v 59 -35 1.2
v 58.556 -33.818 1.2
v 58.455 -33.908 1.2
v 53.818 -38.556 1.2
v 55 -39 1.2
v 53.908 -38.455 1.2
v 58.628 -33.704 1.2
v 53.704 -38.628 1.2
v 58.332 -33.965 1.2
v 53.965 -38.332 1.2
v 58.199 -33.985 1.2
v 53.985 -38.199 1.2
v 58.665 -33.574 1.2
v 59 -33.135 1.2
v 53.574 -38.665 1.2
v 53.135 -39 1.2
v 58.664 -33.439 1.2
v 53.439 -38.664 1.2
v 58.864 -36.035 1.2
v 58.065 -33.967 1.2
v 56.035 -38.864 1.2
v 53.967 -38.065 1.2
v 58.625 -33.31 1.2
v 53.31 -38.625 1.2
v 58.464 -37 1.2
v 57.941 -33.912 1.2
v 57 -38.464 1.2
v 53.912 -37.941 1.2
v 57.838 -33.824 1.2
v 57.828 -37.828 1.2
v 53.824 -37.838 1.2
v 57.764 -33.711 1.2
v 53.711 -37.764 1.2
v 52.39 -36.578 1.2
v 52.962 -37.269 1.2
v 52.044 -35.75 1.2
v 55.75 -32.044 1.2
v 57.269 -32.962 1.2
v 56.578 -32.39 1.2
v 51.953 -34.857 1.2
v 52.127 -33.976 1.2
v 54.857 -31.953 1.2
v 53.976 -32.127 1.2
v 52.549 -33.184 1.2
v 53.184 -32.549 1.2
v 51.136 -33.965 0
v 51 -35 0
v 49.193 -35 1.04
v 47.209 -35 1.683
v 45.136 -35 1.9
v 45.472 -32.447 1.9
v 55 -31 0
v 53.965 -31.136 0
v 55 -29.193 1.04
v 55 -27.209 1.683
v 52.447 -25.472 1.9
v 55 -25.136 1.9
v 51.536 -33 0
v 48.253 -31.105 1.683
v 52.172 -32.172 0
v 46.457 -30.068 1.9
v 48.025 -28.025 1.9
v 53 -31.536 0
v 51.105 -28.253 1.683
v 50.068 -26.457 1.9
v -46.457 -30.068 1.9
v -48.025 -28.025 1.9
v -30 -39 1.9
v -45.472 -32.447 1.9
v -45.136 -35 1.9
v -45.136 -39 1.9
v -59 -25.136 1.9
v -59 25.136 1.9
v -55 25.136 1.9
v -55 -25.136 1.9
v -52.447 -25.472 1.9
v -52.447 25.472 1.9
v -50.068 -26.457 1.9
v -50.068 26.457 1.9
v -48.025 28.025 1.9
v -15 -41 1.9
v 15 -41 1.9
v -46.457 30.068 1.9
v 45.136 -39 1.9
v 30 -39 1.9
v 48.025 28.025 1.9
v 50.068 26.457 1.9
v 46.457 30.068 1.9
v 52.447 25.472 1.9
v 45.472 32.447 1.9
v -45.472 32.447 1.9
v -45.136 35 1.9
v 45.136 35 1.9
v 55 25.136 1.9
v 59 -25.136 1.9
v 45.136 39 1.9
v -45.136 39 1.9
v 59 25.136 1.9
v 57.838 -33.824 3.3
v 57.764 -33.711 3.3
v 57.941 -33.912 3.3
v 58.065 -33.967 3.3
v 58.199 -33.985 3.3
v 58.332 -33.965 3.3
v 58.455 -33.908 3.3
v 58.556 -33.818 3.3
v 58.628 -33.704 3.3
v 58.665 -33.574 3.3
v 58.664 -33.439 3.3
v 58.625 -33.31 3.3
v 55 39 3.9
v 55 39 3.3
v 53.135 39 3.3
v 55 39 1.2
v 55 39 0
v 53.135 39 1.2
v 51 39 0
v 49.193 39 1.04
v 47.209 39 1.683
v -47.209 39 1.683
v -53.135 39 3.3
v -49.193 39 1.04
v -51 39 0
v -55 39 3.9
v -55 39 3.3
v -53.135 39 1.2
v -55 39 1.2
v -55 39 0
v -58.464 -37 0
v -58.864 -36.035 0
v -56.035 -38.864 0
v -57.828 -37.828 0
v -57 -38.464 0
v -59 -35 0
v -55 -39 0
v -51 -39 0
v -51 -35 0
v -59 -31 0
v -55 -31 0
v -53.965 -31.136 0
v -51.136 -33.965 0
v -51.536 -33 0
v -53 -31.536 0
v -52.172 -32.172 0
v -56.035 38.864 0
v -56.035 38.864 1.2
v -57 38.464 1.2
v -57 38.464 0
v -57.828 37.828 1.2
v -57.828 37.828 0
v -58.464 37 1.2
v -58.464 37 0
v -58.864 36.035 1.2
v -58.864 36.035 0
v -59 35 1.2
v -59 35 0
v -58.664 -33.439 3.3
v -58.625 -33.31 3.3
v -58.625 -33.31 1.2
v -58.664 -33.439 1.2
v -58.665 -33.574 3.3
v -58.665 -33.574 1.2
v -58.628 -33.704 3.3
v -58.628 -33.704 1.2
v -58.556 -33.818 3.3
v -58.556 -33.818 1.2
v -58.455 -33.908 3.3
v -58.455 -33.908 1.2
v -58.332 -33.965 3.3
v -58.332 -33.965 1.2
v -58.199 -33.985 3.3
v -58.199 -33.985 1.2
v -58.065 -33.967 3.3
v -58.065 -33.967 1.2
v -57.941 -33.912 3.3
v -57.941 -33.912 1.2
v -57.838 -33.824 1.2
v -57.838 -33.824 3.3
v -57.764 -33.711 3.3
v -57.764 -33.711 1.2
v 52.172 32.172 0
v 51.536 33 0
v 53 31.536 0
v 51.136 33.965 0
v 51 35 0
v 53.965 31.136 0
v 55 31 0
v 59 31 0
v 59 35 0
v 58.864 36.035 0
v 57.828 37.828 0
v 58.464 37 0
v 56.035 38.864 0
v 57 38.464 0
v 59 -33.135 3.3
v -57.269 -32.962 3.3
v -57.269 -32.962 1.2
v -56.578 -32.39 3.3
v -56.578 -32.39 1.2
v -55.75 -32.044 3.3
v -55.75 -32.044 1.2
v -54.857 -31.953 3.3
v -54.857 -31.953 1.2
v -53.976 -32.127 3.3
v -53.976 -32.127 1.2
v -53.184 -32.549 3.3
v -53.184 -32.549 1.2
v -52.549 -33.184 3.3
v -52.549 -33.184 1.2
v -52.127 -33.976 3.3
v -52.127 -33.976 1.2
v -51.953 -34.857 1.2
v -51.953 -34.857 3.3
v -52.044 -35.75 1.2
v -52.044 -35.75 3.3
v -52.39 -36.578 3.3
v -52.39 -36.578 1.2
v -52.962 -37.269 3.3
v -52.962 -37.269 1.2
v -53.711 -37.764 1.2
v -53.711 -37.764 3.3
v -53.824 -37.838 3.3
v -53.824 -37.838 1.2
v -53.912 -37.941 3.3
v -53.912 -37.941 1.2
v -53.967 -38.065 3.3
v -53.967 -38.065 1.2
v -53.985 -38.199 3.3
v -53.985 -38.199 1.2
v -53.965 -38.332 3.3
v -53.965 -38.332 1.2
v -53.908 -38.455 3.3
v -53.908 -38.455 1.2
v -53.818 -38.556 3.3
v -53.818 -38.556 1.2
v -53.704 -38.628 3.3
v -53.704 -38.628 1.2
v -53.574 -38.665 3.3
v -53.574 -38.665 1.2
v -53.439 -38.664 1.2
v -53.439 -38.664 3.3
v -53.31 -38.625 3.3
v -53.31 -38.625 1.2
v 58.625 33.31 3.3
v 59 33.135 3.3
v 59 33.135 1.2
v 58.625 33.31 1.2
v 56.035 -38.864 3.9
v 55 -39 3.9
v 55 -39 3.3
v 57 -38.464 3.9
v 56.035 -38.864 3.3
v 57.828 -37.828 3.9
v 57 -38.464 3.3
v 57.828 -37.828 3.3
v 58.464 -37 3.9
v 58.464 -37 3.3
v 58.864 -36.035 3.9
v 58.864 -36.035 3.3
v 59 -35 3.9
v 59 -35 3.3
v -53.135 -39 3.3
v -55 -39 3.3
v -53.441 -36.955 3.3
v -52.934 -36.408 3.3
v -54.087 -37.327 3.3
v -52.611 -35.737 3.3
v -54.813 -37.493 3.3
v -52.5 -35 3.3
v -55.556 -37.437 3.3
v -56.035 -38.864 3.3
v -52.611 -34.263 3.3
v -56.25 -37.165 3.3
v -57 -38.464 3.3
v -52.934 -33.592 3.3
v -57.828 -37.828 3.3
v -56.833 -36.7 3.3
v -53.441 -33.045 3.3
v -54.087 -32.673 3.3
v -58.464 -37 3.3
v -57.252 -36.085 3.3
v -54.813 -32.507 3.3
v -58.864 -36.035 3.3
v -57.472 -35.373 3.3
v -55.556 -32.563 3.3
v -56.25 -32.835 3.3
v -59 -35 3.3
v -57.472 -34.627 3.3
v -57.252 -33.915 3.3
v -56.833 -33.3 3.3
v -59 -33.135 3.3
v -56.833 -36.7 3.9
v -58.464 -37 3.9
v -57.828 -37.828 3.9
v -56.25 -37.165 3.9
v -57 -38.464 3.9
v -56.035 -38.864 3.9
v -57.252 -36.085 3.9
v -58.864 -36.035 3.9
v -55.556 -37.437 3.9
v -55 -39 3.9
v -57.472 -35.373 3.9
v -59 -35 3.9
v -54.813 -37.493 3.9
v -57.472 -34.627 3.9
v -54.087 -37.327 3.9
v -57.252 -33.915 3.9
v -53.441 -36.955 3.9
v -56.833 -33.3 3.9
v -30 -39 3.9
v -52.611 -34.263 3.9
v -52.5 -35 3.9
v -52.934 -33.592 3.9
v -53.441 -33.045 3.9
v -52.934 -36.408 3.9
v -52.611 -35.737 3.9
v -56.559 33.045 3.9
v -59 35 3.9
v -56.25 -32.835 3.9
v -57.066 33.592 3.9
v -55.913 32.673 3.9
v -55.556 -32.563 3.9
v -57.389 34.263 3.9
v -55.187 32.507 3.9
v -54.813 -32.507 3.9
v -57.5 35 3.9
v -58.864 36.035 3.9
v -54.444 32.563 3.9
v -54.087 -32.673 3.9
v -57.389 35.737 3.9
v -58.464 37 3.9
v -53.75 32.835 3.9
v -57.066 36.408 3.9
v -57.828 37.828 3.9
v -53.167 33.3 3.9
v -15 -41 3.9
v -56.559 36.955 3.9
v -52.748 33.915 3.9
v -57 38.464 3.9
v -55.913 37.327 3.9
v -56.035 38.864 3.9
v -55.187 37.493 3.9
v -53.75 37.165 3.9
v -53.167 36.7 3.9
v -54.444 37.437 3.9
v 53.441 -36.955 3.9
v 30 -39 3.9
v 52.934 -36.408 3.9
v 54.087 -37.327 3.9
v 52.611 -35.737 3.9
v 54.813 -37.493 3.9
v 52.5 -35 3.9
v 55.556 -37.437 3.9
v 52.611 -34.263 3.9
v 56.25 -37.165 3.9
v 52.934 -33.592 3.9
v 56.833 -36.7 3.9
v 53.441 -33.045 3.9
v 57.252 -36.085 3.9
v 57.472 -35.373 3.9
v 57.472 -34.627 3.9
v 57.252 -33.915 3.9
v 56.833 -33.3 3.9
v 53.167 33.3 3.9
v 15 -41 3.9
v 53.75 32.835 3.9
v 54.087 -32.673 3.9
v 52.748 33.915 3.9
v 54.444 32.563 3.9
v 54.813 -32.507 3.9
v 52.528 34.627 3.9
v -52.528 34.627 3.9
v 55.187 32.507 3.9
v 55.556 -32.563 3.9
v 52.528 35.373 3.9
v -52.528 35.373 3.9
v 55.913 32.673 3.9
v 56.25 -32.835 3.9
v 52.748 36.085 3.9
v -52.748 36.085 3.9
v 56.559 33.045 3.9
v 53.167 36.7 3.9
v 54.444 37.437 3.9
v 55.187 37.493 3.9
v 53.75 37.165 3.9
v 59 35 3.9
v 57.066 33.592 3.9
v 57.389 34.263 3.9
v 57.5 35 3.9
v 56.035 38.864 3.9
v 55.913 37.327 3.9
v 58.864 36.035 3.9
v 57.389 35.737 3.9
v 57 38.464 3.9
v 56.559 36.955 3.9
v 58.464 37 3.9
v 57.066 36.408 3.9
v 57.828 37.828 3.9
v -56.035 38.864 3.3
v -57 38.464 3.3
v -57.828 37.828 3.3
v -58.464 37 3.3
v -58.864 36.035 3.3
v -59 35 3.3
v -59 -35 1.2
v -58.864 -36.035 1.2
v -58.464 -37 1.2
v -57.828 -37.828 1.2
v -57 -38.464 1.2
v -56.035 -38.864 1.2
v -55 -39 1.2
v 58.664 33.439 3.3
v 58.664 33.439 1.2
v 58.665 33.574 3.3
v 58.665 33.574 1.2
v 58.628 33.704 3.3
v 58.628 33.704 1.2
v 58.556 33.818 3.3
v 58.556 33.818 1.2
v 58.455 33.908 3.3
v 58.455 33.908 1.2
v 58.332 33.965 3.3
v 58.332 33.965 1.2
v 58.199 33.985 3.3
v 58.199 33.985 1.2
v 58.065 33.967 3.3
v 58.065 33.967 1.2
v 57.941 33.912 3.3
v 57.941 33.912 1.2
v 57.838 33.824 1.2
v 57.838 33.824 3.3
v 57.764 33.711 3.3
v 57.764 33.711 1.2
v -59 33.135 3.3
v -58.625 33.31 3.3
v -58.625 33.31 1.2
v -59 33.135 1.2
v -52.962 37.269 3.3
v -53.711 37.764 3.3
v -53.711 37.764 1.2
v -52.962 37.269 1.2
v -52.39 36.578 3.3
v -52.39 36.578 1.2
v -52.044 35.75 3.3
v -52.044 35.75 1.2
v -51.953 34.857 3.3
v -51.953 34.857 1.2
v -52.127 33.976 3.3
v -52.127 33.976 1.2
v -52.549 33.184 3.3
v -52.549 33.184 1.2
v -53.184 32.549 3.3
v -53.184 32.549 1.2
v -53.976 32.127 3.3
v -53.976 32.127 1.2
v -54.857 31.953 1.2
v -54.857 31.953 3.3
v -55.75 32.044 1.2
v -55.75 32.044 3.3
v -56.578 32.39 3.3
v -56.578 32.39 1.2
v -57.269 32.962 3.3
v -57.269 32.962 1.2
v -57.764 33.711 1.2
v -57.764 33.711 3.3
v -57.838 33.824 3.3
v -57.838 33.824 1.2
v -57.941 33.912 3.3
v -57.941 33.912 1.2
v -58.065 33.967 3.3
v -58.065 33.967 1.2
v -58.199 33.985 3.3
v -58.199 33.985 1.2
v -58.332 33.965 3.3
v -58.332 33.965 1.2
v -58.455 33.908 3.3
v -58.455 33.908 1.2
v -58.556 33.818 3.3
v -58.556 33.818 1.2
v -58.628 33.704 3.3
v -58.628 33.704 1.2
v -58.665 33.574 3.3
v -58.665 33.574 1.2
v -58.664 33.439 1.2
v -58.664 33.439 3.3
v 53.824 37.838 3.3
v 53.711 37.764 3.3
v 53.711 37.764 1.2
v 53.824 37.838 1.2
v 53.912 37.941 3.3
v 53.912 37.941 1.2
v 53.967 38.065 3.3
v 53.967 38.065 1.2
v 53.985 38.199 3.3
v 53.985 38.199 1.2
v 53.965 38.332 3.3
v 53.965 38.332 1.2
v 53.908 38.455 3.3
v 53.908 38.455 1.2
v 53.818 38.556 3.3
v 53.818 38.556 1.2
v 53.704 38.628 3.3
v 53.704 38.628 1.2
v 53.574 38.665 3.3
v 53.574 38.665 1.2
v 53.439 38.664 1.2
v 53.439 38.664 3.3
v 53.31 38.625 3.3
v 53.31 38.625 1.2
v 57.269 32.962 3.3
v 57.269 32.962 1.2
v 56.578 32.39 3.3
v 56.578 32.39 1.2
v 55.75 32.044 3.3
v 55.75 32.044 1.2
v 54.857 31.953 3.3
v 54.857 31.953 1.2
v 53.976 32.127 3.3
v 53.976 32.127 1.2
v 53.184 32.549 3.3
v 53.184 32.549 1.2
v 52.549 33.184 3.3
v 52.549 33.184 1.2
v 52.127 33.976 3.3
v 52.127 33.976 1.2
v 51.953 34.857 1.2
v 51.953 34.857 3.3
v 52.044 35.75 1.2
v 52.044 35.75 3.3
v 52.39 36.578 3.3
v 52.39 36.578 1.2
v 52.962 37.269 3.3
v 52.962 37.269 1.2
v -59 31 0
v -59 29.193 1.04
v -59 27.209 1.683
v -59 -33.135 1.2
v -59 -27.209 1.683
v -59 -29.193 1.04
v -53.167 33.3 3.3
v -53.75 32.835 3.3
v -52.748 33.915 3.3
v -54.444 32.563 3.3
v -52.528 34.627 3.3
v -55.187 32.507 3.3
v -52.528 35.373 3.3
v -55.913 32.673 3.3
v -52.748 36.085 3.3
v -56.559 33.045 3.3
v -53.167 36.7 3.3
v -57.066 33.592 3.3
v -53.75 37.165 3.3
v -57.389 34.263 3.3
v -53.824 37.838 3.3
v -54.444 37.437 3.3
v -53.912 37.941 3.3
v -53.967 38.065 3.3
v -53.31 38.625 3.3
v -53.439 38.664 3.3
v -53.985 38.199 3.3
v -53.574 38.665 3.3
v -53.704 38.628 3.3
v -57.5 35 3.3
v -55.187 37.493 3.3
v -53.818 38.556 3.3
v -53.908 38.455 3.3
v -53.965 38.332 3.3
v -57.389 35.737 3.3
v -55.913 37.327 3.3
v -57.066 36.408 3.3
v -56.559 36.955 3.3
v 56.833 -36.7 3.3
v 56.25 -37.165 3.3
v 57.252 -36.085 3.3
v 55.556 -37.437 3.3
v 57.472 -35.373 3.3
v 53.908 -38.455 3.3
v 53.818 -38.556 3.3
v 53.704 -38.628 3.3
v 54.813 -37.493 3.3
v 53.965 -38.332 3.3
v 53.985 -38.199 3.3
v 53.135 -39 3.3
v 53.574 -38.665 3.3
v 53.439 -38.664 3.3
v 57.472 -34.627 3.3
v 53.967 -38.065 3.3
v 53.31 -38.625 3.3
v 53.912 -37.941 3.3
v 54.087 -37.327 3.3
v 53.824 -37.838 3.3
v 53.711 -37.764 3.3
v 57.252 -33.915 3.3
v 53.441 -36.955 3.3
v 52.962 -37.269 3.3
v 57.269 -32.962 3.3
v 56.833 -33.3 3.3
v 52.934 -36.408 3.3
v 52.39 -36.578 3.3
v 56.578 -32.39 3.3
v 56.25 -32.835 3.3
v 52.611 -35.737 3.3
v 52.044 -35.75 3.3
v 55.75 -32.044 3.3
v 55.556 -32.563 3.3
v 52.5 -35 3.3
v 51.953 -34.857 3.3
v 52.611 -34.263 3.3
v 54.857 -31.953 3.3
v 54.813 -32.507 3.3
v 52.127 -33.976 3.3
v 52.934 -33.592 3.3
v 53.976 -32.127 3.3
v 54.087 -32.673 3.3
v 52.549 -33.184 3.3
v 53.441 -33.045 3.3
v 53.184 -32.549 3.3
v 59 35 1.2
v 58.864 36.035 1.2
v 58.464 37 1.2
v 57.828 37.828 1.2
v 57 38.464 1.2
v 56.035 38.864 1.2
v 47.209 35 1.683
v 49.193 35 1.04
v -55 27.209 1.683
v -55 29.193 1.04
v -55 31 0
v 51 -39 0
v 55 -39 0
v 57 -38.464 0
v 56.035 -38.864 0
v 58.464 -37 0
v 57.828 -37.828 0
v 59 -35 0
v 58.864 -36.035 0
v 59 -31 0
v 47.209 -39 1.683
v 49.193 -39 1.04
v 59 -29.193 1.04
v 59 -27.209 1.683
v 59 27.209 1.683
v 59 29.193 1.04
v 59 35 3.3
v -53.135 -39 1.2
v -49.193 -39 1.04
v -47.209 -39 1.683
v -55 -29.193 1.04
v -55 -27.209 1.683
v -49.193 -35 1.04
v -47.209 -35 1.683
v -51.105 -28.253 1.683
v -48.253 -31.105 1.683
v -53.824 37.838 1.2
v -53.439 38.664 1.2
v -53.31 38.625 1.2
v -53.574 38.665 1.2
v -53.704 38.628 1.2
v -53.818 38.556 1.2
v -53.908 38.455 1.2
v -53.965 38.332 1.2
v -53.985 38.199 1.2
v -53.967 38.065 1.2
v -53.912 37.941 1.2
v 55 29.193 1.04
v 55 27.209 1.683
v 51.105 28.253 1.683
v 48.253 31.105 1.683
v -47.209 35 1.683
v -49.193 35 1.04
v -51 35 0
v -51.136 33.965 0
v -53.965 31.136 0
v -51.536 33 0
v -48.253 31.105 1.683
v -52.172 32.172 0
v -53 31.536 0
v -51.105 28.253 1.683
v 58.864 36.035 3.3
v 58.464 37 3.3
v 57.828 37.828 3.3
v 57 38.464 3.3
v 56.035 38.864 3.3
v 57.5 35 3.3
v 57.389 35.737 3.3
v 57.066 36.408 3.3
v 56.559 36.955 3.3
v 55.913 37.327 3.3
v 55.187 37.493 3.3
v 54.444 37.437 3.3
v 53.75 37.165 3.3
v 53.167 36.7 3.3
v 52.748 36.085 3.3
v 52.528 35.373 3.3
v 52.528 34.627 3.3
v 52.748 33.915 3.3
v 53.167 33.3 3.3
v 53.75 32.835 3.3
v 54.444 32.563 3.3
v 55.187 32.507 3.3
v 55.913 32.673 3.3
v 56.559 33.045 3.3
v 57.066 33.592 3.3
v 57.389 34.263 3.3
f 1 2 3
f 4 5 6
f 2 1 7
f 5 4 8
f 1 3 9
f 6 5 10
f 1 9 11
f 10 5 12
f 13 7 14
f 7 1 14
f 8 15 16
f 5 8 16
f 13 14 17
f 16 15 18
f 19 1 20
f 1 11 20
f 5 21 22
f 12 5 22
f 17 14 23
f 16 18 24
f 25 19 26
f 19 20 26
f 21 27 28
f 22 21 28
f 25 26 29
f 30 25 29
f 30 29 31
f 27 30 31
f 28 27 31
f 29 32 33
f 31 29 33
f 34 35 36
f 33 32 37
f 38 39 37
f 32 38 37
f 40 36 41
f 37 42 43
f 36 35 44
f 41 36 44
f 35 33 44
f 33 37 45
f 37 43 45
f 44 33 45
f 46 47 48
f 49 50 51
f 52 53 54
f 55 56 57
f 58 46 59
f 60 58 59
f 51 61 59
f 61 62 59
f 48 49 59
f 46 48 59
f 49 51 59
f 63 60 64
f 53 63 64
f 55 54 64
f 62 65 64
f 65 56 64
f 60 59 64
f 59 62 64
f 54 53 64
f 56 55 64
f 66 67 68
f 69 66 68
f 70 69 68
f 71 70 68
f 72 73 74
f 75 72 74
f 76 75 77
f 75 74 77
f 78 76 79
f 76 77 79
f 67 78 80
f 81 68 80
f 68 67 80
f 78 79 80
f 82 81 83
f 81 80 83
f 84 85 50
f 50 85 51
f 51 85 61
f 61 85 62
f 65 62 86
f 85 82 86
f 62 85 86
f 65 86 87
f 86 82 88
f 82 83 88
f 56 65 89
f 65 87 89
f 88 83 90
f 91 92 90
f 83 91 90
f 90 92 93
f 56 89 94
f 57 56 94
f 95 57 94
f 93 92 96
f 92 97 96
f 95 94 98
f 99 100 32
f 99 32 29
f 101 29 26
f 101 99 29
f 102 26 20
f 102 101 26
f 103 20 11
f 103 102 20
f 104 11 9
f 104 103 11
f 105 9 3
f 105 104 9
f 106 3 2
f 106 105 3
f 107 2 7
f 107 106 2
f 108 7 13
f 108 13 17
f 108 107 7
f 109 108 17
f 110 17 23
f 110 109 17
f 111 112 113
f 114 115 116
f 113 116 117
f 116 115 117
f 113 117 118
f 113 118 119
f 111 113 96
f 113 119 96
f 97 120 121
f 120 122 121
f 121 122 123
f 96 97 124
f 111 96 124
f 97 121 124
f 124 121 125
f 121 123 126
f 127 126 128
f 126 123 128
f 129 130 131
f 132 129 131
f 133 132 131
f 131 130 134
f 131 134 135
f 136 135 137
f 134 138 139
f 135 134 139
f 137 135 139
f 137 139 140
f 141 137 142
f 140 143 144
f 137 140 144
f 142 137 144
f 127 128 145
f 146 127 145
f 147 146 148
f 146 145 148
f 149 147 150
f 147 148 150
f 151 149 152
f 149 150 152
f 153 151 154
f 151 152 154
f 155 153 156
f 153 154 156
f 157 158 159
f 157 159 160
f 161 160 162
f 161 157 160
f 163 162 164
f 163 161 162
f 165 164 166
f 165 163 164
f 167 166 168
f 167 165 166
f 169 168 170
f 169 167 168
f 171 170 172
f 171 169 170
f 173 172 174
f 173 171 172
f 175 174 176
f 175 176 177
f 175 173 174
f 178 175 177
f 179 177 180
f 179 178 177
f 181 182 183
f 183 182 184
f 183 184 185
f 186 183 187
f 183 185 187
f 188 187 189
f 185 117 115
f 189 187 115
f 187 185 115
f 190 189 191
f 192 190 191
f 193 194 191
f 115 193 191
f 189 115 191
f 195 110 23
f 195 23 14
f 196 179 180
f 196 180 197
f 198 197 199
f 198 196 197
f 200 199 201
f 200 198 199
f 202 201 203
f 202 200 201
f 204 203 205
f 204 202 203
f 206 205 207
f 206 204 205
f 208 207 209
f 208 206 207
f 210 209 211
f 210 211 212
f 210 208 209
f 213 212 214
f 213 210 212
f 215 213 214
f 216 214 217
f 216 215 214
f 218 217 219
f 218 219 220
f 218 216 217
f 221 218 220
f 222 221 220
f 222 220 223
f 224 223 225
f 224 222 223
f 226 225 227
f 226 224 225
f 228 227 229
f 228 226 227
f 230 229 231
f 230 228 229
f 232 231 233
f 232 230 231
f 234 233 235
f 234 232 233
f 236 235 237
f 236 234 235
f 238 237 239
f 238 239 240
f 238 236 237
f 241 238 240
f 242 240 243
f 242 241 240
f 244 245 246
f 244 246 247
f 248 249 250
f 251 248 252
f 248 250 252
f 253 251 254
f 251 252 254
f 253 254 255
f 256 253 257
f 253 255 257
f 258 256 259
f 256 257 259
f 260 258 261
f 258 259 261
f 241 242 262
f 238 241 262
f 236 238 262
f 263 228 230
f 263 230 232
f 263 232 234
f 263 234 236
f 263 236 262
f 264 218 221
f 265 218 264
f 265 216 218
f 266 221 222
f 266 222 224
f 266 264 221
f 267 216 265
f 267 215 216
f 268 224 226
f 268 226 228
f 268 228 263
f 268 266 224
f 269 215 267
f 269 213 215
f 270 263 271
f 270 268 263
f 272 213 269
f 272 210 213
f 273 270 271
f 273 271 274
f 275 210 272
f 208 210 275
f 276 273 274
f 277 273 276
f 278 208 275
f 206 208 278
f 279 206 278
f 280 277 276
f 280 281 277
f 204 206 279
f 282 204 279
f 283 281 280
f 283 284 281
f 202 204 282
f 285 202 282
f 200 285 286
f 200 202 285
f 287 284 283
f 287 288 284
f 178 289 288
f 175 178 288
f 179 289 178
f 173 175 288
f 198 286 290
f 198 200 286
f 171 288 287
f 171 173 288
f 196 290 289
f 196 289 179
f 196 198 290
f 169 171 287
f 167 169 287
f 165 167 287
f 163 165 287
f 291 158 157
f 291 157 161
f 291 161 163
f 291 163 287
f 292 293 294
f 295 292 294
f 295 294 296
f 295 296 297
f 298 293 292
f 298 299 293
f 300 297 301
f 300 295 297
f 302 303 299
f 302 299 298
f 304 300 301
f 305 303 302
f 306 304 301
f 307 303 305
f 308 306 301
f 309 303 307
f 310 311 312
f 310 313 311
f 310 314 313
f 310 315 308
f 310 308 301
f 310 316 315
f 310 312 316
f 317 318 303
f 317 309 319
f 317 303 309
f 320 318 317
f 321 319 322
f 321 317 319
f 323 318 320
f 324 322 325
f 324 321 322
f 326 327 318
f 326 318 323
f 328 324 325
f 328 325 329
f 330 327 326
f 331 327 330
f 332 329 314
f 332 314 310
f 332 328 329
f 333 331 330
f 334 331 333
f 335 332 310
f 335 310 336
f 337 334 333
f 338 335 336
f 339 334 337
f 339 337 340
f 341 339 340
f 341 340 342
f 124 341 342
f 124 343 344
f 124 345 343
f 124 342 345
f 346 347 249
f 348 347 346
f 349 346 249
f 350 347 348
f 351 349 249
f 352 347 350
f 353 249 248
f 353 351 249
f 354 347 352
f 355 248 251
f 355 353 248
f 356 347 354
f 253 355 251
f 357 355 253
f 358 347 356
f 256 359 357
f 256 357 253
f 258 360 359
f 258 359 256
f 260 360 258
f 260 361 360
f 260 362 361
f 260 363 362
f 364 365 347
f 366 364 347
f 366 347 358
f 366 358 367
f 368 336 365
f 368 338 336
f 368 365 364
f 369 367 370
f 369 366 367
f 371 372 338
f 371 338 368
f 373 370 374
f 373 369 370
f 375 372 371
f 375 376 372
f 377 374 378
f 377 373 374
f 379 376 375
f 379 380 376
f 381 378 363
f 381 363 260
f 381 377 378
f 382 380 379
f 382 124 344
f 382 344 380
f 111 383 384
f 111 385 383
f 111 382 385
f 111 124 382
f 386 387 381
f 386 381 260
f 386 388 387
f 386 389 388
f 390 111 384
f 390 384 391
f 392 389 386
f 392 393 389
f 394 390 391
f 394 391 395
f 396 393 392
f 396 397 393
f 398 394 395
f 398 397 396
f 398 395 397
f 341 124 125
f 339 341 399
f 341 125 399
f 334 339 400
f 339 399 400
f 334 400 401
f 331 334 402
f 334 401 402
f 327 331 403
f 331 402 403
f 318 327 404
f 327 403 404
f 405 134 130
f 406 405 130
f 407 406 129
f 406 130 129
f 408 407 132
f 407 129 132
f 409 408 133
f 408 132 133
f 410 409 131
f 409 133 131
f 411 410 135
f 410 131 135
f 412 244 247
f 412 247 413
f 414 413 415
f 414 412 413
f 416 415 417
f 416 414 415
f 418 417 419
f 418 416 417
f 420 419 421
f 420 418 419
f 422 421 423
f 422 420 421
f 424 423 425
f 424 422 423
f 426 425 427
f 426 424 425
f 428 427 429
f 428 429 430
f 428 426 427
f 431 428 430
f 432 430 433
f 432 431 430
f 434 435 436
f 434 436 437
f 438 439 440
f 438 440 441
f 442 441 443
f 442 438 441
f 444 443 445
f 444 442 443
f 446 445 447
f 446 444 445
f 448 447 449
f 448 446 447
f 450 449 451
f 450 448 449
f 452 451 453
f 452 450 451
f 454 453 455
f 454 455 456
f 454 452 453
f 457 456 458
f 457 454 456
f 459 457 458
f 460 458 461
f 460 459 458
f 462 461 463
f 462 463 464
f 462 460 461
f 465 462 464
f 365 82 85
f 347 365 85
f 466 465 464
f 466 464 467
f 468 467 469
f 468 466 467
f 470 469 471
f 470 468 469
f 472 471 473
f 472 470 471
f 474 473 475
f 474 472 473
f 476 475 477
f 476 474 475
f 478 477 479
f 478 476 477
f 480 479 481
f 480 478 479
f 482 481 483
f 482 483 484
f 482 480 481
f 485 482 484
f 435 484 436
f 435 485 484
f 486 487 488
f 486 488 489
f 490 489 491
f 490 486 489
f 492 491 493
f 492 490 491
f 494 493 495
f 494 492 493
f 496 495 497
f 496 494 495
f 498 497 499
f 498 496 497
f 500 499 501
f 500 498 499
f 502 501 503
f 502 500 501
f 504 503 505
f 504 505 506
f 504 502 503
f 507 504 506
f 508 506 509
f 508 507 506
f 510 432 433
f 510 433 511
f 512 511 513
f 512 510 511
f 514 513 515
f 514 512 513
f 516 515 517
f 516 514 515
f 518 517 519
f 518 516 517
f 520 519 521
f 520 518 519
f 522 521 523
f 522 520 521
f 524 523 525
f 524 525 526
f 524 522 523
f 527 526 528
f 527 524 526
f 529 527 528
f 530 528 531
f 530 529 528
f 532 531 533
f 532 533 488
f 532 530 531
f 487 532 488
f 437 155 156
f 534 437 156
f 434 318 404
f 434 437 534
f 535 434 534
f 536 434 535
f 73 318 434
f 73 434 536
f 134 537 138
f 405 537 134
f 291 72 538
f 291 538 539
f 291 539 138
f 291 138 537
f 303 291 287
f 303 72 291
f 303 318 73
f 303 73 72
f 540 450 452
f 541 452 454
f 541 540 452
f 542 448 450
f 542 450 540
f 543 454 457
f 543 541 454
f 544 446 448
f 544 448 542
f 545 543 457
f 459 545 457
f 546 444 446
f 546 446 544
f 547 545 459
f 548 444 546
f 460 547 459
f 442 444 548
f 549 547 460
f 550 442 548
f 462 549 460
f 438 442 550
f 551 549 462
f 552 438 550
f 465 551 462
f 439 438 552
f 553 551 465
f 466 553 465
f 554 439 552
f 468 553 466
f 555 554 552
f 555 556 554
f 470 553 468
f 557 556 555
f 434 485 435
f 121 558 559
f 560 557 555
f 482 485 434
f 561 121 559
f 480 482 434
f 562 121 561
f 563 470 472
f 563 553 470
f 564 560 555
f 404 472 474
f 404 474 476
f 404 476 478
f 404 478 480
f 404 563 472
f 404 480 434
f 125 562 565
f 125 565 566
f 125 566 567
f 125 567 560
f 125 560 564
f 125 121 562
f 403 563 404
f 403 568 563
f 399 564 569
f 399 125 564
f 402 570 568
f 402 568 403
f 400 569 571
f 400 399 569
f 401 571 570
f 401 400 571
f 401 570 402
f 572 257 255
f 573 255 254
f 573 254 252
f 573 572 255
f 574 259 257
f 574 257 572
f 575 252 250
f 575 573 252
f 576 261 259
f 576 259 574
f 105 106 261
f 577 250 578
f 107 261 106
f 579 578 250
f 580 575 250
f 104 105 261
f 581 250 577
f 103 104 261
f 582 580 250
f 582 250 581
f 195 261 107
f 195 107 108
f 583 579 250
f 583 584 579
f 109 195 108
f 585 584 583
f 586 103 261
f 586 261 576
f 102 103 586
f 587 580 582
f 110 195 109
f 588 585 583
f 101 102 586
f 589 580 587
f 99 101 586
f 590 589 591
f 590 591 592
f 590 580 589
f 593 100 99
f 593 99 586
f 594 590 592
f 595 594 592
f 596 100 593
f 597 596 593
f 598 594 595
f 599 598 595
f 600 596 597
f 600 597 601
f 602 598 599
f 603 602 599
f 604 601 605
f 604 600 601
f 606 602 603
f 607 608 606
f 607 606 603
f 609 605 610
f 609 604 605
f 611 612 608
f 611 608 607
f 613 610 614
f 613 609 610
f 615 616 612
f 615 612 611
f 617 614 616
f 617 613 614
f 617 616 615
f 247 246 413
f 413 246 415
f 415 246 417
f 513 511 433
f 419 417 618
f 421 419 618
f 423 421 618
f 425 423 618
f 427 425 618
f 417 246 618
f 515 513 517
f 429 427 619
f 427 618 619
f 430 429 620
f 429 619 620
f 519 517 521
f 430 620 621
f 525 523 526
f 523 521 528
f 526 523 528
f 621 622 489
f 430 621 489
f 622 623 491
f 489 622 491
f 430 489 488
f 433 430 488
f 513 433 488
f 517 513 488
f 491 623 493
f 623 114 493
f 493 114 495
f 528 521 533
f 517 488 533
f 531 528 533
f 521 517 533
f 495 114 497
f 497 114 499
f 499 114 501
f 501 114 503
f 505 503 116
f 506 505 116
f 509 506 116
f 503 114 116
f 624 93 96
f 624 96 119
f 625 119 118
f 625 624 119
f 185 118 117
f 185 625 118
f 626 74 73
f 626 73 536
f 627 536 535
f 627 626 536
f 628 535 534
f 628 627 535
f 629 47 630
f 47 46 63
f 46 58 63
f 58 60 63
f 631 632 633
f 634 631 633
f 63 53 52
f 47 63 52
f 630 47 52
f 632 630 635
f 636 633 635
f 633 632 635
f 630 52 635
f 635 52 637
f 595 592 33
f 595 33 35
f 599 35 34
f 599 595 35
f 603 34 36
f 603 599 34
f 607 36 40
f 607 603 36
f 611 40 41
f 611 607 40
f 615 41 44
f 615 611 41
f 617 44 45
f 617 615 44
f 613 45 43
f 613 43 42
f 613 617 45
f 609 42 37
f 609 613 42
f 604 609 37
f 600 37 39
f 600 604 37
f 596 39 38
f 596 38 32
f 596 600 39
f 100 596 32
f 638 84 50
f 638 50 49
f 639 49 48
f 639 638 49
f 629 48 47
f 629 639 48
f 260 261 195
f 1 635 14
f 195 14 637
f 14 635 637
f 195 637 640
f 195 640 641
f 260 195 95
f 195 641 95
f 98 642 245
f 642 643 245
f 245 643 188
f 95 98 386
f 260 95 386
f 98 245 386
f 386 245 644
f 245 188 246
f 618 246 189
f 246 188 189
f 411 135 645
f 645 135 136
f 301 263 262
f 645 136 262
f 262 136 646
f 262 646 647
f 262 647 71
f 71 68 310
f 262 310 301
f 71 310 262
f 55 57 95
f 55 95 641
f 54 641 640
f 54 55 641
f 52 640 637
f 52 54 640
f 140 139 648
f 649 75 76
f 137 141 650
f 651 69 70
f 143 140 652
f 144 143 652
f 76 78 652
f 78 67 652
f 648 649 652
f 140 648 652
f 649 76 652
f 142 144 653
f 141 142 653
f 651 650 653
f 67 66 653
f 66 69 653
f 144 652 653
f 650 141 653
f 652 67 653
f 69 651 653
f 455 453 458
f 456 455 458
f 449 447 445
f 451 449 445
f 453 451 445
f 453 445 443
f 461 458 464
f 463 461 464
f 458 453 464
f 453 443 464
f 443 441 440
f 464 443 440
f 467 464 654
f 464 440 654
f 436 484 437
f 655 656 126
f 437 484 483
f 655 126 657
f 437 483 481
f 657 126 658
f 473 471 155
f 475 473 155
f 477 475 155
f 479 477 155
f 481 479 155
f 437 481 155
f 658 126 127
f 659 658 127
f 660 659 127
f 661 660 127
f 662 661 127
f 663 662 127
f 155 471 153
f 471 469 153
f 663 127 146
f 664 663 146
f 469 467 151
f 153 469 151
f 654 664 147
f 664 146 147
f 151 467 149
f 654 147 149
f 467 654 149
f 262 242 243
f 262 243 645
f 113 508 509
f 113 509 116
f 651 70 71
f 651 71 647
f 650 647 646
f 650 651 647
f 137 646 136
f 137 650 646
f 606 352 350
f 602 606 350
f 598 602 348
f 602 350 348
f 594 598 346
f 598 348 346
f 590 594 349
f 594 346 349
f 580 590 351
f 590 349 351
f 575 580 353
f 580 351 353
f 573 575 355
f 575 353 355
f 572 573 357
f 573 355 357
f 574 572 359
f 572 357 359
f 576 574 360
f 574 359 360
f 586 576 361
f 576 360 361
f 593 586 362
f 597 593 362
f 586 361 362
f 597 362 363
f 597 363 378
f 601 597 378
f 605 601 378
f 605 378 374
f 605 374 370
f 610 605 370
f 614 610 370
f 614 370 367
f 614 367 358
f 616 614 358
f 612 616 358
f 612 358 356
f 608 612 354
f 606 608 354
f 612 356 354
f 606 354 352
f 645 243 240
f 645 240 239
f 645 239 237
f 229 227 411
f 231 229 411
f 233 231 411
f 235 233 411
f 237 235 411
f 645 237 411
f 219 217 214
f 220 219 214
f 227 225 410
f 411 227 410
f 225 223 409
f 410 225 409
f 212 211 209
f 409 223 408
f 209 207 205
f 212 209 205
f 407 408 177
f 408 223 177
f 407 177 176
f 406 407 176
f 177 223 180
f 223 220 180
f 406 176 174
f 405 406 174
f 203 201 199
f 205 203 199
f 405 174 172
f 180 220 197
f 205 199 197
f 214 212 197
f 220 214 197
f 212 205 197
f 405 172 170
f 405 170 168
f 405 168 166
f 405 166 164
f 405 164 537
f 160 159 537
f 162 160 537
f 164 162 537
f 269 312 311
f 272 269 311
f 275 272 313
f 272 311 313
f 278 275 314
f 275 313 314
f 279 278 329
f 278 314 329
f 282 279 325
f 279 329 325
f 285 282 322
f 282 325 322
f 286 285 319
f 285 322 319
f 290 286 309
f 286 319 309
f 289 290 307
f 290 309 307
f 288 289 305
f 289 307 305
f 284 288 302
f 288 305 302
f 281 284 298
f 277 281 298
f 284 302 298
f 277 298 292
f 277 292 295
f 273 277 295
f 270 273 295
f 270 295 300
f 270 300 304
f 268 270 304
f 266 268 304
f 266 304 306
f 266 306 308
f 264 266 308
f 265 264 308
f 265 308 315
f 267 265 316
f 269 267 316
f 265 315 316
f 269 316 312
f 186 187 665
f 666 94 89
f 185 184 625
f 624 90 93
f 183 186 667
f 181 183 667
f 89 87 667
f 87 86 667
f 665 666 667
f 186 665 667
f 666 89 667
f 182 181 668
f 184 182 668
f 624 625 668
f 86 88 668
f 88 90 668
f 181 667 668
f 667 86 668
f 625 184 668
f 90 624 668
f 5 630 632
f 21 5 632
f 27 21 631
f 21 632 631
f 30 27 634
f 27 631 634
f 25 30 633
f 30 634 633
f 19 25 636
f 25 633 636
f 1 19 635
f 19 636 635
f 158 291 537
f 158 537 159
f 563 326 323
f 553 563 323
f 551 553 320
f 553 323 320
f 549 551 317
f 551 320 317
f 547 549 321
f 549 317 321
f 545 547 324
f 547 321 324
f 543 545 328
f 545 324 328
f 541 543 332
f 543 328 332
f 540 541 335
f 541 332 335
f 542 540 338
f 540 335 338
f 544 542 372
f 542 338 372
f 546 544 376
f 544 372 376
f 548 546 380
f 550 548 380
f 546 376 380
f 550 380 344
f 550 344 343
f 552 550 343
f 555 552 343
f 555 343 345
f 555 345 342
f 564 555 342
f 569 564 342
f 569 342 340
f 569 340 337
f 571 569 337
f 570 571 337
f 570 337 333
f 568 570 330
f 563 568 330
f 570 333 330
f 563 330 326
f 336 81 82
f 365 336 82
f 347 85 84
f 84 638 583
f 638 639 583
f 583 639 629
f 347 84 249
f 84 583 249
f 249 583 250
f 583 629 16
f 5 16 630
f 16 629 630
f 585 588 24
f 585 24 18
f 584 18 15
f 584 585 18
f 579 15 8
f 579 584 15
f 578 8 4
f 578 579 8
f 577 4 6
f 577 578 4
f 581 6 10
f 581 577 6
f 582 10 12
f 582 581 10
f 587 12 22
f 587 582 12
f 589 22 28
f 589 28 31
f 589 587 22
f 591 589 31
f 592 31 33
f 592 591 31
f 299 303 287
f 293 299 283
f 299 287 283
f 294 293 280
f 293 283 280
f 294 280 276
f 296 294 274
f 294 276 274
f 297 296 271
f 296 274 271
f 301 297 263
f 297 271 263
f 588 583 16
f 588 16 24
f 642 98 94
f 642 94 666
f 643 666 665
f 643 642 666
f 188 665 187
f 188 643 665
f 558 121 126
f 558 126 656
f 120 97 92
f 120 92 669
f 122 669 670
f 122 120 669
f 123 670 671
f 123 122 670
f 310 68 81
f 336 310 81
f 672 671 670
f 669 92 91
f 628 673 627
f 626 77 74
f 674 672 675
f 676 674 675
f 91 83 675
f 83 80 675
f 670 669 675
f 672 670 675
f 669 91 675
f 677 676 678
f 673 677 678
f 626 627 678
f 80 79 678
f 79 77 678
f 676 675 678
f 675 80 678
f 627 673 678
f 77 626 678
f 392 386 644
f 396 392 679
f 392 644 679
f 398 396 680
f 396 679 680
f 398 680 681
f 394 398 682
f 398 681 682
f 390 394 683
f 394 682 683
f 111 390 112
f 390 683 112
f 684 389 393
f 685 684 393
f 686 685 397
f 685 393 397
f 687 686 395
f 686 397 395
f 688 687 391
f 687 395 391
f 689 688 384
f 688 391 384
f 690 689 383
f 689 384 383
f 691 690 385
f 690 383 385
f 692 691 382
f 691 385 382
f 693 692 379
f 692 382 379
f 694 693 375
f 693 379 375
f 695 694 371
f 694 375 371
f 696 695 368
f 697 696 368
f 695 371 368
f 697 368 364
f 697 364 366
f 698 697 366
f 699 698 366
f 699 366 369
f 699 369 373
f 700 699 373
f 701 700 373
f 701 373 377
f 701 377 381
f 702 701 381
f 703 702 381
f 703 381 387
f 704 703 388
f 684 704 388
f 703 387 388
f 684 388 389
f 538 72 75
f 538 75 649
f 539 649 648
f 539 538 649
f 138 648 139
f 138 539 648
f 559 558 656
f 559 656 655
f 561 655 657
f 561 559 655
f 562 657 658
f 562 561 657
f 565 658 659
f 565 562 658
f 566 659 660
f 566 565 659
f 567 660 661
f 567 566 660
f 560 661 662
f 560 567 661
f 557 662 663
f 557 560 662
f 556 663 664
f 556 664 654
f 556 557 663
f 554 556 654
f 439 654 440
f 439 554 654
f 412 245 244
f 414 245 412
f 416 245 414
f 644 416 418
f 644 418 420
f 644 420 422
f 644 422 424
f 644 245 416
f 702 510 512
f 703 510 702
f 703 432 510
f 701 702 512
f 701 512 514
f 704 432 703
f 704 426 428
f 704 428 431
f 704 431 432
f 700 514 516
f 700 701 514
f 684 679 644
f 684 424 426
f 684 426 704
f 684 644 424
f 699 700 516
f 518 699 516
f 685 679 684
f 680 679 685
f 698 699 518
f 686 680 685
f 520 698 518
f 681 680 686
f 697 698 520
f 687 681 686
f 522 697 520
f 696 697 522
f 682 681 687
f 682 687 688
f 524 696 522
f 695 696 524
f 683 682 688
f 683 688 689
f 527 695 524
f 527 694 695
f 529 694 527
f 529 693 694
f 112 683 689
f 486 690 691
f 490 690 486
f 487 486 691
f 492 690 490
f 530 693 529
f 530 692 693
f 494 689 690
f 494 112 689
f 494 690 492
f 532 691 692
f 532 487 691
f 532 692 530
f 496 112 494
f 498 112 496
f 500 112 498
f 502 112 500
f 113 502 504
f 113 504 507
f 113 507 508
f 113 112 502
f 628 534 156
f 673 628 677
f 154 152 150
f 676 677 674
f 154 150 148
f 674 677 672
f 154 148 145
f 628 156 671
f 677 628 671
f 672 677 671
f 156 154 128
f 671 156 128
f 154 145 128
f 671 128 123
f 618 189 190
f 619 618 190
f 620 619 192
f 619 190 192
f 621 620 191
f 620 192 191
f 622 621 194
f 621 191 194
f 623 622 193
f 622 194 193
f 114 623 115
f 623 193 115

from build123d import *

# Parameters (mm, degrees)
EXTRUDE_1_DEPTH     = 3.9
SKETCH_2_R          = 2.5
CUT_EXTRUDE_1_DEPTH = 0.6
CUT_EXTRUDE_2_DEPTH = 2.1
CUT_EXTRUDE_4_DEPTH = 1.9
FILLET_2_R          = 10


with BuildPart() as part:
    # 草图1 → 凸台-拉伸1 (new body)
    with BuildSketch(Plane.XY):
        with BuildLine():
            Line((-55, -39), (-30, -39))
            Line((-30, -39), (-15, -41))
            Line((-15, -41), (15, -41))
            Line((15, -41), (30, -39))
            Line((30, -39), (55, -39))
            ThreePointArc((55, -39), (57.828427125, -37.828427125), (59, -35))
            Line((59, -35), (59, 35))
            ThreePointArc((59, 35), (57.828427125, 37.828427125), (55, 39))
            Line((55, 39), (-55, 39))
            ThreePointArc((-55, 39), (-57.828427125, 37.828427125), (-59, 35))
            Line((-59, 35), (-59, -35))
            ThreePointArc((-59, -35), (-57.828427125, -37.828427125), (-55, -39))
        make_face()
    extrude(amount=EXTRUDE_1_DEPTH)

    # 草图2 → 切除-拉伸1 (cut)
    with BuildSketch(Plane.XY.offset(3.9)):
        with Locations((55, 35)):
            Circle(SKETCH_2_R)
        with Locations(Location((-55, 35, 0), (0, 0, 180))):
            Circle(SKETCH_2_R)
        with Locations(Location((55, -35, 0), (0, 0, 180))):
            Circle(SKETCH_2_R)
        with Locations((-55, -35)):
            Circle(SKETCH_2_R)
    extrude(amount=-CUT_EXTRUDE_1_DEPTH, mode=Mode.SUBTRACT)

    # 草图3 → 切除-拉伸2 (cut)
    with BuildSketch(Plane.XY.offset(3.3)):
        with BuildLine():
            Line((53.309526953, 38.625231148), (52.886908691, 39.531538935))
            ThreePointArc((52.886908691, 39.531538935), (58.535533906, 38.535533906), (59.531538935, 32.886908691))
            Line((59.531538935, 32.886908691), (58.625231148, 33.309526953))
            ThreePointArc((58.625231148, 33.309526953), (58.395478624, 33.940766826), (57.76423875, 33.711014302))
            ThreePointArc((57.76423875, 33.711014302), (52.843324317, 32.843324317), (53.711014302, 37.76423875))
            ThreePointArc((53.711014302, 37.76423875), (53.940766826, 38.395478624), (53.309526953, 38.625231148))
        make_face()
        with BuildLine():
            Line((-58.625231148, 33.309526953), (-59.531538935, 32.886908691))
            ThreePointArc((-59.531538935, 32.886908691), (-58.535533906, 38.535533906), (-52.886908691, 39.531538935))
            Line((-52.886908691, 39.531538935), (-53.309526953, 38.625231148))
            ThreePointArc((-53.309526953, 38.625231148), (-53.940766826, 38.395478624), (-53.711014302, 37.76423875))
            ThreePointArc((-53.711014302, 37.76423875), (-52.843324317, 32.843324317), (-57.76423875, 33.711014302))
            ThreePointArc((-57.76423875, 33.711014302), (-58.395478624, 33.940766826), (-58.625231148, 33.309526953))
        make_face()
        with BuildLine():
            Line((-53.309526953, -38.625231148), (-52.886908691, -39.531538935))
            ThreePointArc((-52.886908691, -39.531538935), (-58.535533906, -38.535533906), (-59.531538935, -32.886908691))
            Line((-59.531538935, -32.886908691), (-58.625231148, -33.309526953))
            ThreePointArc((-58.625231148, -33.309526953), (-58.395478624, -33.940766826), (-57.76423875, -33.711014302))
            ThreePointArc((-57.76423875, -33.711014302), (-52.843324317, -32.843324317), (-53.711014302, -37.76423875))
            ThreePointArc((-53.711014302, -37.76423875), (-53.940766826, -38.395478624), (-53.309526953, -38.625231148))
        make_face()
        with BuildLine():
            Line((58.625231148, -33.309526953), (59.531538935, -32.886908691))
            ThreePointArc((59.531538935, -32.886908691), (58.535533906, -38.535533906), (52.886908691, -39.531538935))
            Line((52.886908691, -39.531538935), (53.309526953, -38.625231148))
            ThreePointArc((53.309526953, -38.625231148), (53.940766826, -38.395478624), (53.711014302, -37.76423875))
            ThreePointArc((53.711014302, -37.76423875), (52.843324317, -32.843324317), (57.76423875, -33.711014302))
            ThreePointArc((57.76423875, -33.711014302), (58.395478624, -33.940766826), (58.625231148, -33.309526953))
        make_face()
    extrude(amount=-CUT_EXTRUDE_2_DEPTH, mode=Mode.SUBTRACT)

    # 草图5 → 切除-拉伸4 (cut)
    with BuildSketch(Plane(origin=(0, 0, 0), x_dir=(-1, 0, 0), z_dir=(0, 0, -1))):
        with BuildLine():
            Line((-51, 35), (-51, 39))
            Line((-51, 39), (51, 39))
            Line((51, 39), (51, 35))
            ThreePointArc((51, 35), (52.171572875, 32.171572875), (55, 31))
            Line((55, 31), (59, 31))
            Line((59, 31), (59, -31))
            Line((59, -31), (55, -31))
            ThreePointArc((55, -31), (52.171572875, -32.171572875), (51, -35))
            Line((51, -35), (51, -39))
            Line((51, -39), (30, -39))
            Line((30, -39), (15, -41))
            Line((15, -41), (-15, -41))
            Line((-15, -41), (-30, -39))
            Line((-30, -39), (-51, -39))
            Line((-51, -39), (-51, -35))
            ThreePointArc((-51, -35), (-52.171572875, -32.171572875), (-55, -31))
            Line((-55, -31), (-59, -31))
            Line((-59, -31), (-59, 31))
            Line((-59, 31), (-55, 31))
            ThreePointArc((-55, 31), (-52.171572875, 32.171572875), (-51, 35))
        make_face()
    extrude(amount=-CUT_EXTRUDE_4_DEPTH, mode=Mode.SUBTRACT)

    # 圆角2
    # the kernel refuses this fillet: 10 mm, written as the material it adds along each edge
    with BuildSketch(Plane(origin=(-59, -31, 1.9), x_dir=(0, 1, 0), z_dir=(1, 0, 0)), Plane(origin=(-51, 39, 1.9), x_dir=(1, 0, 0), z_dir=(0, -1, 0)), Plane(origin=(55, -31, 1.9), x_dir=(0, 1, 0), z_dir=(1, 0, 0)), Plane(origin=(51, 35, 1.9), x_dir=(-1, 0, 0), z_dir=(0, 1, 0)), Plane(origin=(59, 31, 1.9), x_dir=(0, -1, 0), z_dir=(-1, 0, 0)), Plane(origin=(-55, 31, 1.9), x_dir=(0, -1, 0), z_dir=(-1, 0, 0)), Plane(origin=(51, -39, 1.9), x_dir=(-1, 0, 0), z_dir=(0, 1, 0))) as fillet_2_piece_1:
        with BuildLine():
            CenterArc((5.864298765, -10), FILLET_2_R, 90, 35.904068583)
            Line((0, -1.9), (-0.117285975, -1.738))
            ThreePointArc((-0.117285975, -1.738), (-0.2, -0.95), (-0.2, 0))
            Line((-0.2, 0), (0, 0.2))
            Line((0, 0.2), (5.864298765, 0.2))
            Line((5.864298765, 0.2), (5.864298765, 0))
        make_face()
    extrude(amount=4)
    with BuildSketch(Plane(origin=(-55, -35, 1.9), x_dir=(0, 1, 0), z_dir=(-1, 0, 0))) as fillet_2_piece_2:
        with BuildLine():
            CenterArc((9.864298765, 10), FILLET_2_R, 234.095931417, 35.904068583)
            Line((4, 1.9), (3.882714025, 1.738))
            ThreePointArc((3.882714025, 1.738), (3.8, 0.95), (3.8, 0))
            Line((3.8, 0), (4, -0.2))
            Line((4, -0.2), (9.864298765, -0.2))
            Line((9.864298765, -0.2), (9.864298765, 0))
        make_face()
    revolve(axis=Axis((-55, -35, 1.9), (0, 0, -1)), revolution_arc=90)
    with BuildSketch(Plane(origin=(-55, 35, 1.9), x_dir=(1, 0, 0), z_dir=(0, 1, 0))) as fillet_2_piece_3:
        with BuildLine():
            CenterArc((9.864298765, 10), FILLET_2_R, 234.095931417, 35.904068583)
            Line((4, 1.9), (3.882714025, 1.738))
            ThreePointArc((3.882714025, 1.738), (3.8, 0.95), (3.8, 0))
            Line((3.8, 0), (4, -0.2))
            Line((4, -0.2), (9.864298765, -0.2))
            Line((9.864298765, -0.2), (9.864298765, 0))
        make_face()
    revolve(axis=Axis((-55, 35, 1.9), (0, 0, -1)), revolution_arc=90)
    with BuildSketch(Plane(origin=(55, -35, 1.9), x_dir=(-1, 0, 0), z_dir=(0, -1, 0))) as fillet_2_piece_4:
        with BuildLine():
            CenterArc((9.864298765, 10), FILLET_2_R, 234.095931417, 35.904068583)
            Line((4, 1.9), (3.882714025, 1.738))
            ThreePointArc((3.882714025, 1.738), (3.8, 0.95), (3.8, 0))
            Line((3.8, 0), (4, -0.2))
            Line((4, -0.2), (9.864298765, -0.2))
            Line((9.864298765, -0.2), (9.864298765, 0))
        make_face()
    revolve(axis=Axis((55, -35, 1.9), (0, 0, -1)), revolution_arc=90)
    with BuildSketch(Plane(origin=(-51, -35, 1.9), x_dir=(0, 0, -1), z_dir=(0, -1, 0))) as fillet_2_piece_5:
        with BuildLine():
            CenterArc((10, 5.864298765), FILLET_2_R, 180, 35.904068583)
            Line((0, 5.864298765), (-0.2, 5.864298765))
            Line((-0.2, 5.864298765), (-0.2, 0))
            Line((-0.2, 0), (0, -0.2))
            ThreePointArc((0, -0.2), (0.95, -0.2), (1.738, -0.117285975))
            Line((1.738, -0.117285975), (1.9, 0))
        make_face()
    extrude(amount=4)
    with BuildSketch(Plane(origin=(55, 35, 1.9), x_dir=(0, -1, 0), z_dir=(1, 0, 0))) as fillet_2_piece_6:
        with BuildLine():
            CenterArc((9.864298765, 10), FILLET_2_R, 234.095931417, 35.904068583)
            Line((4, 1.9), (3.882714025, 1.738))
            ThreePointArc((3.882714025, 1.738), (3.8, 0.95), (3.8, 0))
            Line((3.8, 0), (4, -0.2))
            Line((4, -0.2), (9.864298765, -0.2))
            Line((9.864298765, -0.2), (9.864298765, 0))
        make_face()
    revolve(axis=Axis((55, 35, 1.9), (0, 0, -1)), revolution_arc=90)


solid = part.part
